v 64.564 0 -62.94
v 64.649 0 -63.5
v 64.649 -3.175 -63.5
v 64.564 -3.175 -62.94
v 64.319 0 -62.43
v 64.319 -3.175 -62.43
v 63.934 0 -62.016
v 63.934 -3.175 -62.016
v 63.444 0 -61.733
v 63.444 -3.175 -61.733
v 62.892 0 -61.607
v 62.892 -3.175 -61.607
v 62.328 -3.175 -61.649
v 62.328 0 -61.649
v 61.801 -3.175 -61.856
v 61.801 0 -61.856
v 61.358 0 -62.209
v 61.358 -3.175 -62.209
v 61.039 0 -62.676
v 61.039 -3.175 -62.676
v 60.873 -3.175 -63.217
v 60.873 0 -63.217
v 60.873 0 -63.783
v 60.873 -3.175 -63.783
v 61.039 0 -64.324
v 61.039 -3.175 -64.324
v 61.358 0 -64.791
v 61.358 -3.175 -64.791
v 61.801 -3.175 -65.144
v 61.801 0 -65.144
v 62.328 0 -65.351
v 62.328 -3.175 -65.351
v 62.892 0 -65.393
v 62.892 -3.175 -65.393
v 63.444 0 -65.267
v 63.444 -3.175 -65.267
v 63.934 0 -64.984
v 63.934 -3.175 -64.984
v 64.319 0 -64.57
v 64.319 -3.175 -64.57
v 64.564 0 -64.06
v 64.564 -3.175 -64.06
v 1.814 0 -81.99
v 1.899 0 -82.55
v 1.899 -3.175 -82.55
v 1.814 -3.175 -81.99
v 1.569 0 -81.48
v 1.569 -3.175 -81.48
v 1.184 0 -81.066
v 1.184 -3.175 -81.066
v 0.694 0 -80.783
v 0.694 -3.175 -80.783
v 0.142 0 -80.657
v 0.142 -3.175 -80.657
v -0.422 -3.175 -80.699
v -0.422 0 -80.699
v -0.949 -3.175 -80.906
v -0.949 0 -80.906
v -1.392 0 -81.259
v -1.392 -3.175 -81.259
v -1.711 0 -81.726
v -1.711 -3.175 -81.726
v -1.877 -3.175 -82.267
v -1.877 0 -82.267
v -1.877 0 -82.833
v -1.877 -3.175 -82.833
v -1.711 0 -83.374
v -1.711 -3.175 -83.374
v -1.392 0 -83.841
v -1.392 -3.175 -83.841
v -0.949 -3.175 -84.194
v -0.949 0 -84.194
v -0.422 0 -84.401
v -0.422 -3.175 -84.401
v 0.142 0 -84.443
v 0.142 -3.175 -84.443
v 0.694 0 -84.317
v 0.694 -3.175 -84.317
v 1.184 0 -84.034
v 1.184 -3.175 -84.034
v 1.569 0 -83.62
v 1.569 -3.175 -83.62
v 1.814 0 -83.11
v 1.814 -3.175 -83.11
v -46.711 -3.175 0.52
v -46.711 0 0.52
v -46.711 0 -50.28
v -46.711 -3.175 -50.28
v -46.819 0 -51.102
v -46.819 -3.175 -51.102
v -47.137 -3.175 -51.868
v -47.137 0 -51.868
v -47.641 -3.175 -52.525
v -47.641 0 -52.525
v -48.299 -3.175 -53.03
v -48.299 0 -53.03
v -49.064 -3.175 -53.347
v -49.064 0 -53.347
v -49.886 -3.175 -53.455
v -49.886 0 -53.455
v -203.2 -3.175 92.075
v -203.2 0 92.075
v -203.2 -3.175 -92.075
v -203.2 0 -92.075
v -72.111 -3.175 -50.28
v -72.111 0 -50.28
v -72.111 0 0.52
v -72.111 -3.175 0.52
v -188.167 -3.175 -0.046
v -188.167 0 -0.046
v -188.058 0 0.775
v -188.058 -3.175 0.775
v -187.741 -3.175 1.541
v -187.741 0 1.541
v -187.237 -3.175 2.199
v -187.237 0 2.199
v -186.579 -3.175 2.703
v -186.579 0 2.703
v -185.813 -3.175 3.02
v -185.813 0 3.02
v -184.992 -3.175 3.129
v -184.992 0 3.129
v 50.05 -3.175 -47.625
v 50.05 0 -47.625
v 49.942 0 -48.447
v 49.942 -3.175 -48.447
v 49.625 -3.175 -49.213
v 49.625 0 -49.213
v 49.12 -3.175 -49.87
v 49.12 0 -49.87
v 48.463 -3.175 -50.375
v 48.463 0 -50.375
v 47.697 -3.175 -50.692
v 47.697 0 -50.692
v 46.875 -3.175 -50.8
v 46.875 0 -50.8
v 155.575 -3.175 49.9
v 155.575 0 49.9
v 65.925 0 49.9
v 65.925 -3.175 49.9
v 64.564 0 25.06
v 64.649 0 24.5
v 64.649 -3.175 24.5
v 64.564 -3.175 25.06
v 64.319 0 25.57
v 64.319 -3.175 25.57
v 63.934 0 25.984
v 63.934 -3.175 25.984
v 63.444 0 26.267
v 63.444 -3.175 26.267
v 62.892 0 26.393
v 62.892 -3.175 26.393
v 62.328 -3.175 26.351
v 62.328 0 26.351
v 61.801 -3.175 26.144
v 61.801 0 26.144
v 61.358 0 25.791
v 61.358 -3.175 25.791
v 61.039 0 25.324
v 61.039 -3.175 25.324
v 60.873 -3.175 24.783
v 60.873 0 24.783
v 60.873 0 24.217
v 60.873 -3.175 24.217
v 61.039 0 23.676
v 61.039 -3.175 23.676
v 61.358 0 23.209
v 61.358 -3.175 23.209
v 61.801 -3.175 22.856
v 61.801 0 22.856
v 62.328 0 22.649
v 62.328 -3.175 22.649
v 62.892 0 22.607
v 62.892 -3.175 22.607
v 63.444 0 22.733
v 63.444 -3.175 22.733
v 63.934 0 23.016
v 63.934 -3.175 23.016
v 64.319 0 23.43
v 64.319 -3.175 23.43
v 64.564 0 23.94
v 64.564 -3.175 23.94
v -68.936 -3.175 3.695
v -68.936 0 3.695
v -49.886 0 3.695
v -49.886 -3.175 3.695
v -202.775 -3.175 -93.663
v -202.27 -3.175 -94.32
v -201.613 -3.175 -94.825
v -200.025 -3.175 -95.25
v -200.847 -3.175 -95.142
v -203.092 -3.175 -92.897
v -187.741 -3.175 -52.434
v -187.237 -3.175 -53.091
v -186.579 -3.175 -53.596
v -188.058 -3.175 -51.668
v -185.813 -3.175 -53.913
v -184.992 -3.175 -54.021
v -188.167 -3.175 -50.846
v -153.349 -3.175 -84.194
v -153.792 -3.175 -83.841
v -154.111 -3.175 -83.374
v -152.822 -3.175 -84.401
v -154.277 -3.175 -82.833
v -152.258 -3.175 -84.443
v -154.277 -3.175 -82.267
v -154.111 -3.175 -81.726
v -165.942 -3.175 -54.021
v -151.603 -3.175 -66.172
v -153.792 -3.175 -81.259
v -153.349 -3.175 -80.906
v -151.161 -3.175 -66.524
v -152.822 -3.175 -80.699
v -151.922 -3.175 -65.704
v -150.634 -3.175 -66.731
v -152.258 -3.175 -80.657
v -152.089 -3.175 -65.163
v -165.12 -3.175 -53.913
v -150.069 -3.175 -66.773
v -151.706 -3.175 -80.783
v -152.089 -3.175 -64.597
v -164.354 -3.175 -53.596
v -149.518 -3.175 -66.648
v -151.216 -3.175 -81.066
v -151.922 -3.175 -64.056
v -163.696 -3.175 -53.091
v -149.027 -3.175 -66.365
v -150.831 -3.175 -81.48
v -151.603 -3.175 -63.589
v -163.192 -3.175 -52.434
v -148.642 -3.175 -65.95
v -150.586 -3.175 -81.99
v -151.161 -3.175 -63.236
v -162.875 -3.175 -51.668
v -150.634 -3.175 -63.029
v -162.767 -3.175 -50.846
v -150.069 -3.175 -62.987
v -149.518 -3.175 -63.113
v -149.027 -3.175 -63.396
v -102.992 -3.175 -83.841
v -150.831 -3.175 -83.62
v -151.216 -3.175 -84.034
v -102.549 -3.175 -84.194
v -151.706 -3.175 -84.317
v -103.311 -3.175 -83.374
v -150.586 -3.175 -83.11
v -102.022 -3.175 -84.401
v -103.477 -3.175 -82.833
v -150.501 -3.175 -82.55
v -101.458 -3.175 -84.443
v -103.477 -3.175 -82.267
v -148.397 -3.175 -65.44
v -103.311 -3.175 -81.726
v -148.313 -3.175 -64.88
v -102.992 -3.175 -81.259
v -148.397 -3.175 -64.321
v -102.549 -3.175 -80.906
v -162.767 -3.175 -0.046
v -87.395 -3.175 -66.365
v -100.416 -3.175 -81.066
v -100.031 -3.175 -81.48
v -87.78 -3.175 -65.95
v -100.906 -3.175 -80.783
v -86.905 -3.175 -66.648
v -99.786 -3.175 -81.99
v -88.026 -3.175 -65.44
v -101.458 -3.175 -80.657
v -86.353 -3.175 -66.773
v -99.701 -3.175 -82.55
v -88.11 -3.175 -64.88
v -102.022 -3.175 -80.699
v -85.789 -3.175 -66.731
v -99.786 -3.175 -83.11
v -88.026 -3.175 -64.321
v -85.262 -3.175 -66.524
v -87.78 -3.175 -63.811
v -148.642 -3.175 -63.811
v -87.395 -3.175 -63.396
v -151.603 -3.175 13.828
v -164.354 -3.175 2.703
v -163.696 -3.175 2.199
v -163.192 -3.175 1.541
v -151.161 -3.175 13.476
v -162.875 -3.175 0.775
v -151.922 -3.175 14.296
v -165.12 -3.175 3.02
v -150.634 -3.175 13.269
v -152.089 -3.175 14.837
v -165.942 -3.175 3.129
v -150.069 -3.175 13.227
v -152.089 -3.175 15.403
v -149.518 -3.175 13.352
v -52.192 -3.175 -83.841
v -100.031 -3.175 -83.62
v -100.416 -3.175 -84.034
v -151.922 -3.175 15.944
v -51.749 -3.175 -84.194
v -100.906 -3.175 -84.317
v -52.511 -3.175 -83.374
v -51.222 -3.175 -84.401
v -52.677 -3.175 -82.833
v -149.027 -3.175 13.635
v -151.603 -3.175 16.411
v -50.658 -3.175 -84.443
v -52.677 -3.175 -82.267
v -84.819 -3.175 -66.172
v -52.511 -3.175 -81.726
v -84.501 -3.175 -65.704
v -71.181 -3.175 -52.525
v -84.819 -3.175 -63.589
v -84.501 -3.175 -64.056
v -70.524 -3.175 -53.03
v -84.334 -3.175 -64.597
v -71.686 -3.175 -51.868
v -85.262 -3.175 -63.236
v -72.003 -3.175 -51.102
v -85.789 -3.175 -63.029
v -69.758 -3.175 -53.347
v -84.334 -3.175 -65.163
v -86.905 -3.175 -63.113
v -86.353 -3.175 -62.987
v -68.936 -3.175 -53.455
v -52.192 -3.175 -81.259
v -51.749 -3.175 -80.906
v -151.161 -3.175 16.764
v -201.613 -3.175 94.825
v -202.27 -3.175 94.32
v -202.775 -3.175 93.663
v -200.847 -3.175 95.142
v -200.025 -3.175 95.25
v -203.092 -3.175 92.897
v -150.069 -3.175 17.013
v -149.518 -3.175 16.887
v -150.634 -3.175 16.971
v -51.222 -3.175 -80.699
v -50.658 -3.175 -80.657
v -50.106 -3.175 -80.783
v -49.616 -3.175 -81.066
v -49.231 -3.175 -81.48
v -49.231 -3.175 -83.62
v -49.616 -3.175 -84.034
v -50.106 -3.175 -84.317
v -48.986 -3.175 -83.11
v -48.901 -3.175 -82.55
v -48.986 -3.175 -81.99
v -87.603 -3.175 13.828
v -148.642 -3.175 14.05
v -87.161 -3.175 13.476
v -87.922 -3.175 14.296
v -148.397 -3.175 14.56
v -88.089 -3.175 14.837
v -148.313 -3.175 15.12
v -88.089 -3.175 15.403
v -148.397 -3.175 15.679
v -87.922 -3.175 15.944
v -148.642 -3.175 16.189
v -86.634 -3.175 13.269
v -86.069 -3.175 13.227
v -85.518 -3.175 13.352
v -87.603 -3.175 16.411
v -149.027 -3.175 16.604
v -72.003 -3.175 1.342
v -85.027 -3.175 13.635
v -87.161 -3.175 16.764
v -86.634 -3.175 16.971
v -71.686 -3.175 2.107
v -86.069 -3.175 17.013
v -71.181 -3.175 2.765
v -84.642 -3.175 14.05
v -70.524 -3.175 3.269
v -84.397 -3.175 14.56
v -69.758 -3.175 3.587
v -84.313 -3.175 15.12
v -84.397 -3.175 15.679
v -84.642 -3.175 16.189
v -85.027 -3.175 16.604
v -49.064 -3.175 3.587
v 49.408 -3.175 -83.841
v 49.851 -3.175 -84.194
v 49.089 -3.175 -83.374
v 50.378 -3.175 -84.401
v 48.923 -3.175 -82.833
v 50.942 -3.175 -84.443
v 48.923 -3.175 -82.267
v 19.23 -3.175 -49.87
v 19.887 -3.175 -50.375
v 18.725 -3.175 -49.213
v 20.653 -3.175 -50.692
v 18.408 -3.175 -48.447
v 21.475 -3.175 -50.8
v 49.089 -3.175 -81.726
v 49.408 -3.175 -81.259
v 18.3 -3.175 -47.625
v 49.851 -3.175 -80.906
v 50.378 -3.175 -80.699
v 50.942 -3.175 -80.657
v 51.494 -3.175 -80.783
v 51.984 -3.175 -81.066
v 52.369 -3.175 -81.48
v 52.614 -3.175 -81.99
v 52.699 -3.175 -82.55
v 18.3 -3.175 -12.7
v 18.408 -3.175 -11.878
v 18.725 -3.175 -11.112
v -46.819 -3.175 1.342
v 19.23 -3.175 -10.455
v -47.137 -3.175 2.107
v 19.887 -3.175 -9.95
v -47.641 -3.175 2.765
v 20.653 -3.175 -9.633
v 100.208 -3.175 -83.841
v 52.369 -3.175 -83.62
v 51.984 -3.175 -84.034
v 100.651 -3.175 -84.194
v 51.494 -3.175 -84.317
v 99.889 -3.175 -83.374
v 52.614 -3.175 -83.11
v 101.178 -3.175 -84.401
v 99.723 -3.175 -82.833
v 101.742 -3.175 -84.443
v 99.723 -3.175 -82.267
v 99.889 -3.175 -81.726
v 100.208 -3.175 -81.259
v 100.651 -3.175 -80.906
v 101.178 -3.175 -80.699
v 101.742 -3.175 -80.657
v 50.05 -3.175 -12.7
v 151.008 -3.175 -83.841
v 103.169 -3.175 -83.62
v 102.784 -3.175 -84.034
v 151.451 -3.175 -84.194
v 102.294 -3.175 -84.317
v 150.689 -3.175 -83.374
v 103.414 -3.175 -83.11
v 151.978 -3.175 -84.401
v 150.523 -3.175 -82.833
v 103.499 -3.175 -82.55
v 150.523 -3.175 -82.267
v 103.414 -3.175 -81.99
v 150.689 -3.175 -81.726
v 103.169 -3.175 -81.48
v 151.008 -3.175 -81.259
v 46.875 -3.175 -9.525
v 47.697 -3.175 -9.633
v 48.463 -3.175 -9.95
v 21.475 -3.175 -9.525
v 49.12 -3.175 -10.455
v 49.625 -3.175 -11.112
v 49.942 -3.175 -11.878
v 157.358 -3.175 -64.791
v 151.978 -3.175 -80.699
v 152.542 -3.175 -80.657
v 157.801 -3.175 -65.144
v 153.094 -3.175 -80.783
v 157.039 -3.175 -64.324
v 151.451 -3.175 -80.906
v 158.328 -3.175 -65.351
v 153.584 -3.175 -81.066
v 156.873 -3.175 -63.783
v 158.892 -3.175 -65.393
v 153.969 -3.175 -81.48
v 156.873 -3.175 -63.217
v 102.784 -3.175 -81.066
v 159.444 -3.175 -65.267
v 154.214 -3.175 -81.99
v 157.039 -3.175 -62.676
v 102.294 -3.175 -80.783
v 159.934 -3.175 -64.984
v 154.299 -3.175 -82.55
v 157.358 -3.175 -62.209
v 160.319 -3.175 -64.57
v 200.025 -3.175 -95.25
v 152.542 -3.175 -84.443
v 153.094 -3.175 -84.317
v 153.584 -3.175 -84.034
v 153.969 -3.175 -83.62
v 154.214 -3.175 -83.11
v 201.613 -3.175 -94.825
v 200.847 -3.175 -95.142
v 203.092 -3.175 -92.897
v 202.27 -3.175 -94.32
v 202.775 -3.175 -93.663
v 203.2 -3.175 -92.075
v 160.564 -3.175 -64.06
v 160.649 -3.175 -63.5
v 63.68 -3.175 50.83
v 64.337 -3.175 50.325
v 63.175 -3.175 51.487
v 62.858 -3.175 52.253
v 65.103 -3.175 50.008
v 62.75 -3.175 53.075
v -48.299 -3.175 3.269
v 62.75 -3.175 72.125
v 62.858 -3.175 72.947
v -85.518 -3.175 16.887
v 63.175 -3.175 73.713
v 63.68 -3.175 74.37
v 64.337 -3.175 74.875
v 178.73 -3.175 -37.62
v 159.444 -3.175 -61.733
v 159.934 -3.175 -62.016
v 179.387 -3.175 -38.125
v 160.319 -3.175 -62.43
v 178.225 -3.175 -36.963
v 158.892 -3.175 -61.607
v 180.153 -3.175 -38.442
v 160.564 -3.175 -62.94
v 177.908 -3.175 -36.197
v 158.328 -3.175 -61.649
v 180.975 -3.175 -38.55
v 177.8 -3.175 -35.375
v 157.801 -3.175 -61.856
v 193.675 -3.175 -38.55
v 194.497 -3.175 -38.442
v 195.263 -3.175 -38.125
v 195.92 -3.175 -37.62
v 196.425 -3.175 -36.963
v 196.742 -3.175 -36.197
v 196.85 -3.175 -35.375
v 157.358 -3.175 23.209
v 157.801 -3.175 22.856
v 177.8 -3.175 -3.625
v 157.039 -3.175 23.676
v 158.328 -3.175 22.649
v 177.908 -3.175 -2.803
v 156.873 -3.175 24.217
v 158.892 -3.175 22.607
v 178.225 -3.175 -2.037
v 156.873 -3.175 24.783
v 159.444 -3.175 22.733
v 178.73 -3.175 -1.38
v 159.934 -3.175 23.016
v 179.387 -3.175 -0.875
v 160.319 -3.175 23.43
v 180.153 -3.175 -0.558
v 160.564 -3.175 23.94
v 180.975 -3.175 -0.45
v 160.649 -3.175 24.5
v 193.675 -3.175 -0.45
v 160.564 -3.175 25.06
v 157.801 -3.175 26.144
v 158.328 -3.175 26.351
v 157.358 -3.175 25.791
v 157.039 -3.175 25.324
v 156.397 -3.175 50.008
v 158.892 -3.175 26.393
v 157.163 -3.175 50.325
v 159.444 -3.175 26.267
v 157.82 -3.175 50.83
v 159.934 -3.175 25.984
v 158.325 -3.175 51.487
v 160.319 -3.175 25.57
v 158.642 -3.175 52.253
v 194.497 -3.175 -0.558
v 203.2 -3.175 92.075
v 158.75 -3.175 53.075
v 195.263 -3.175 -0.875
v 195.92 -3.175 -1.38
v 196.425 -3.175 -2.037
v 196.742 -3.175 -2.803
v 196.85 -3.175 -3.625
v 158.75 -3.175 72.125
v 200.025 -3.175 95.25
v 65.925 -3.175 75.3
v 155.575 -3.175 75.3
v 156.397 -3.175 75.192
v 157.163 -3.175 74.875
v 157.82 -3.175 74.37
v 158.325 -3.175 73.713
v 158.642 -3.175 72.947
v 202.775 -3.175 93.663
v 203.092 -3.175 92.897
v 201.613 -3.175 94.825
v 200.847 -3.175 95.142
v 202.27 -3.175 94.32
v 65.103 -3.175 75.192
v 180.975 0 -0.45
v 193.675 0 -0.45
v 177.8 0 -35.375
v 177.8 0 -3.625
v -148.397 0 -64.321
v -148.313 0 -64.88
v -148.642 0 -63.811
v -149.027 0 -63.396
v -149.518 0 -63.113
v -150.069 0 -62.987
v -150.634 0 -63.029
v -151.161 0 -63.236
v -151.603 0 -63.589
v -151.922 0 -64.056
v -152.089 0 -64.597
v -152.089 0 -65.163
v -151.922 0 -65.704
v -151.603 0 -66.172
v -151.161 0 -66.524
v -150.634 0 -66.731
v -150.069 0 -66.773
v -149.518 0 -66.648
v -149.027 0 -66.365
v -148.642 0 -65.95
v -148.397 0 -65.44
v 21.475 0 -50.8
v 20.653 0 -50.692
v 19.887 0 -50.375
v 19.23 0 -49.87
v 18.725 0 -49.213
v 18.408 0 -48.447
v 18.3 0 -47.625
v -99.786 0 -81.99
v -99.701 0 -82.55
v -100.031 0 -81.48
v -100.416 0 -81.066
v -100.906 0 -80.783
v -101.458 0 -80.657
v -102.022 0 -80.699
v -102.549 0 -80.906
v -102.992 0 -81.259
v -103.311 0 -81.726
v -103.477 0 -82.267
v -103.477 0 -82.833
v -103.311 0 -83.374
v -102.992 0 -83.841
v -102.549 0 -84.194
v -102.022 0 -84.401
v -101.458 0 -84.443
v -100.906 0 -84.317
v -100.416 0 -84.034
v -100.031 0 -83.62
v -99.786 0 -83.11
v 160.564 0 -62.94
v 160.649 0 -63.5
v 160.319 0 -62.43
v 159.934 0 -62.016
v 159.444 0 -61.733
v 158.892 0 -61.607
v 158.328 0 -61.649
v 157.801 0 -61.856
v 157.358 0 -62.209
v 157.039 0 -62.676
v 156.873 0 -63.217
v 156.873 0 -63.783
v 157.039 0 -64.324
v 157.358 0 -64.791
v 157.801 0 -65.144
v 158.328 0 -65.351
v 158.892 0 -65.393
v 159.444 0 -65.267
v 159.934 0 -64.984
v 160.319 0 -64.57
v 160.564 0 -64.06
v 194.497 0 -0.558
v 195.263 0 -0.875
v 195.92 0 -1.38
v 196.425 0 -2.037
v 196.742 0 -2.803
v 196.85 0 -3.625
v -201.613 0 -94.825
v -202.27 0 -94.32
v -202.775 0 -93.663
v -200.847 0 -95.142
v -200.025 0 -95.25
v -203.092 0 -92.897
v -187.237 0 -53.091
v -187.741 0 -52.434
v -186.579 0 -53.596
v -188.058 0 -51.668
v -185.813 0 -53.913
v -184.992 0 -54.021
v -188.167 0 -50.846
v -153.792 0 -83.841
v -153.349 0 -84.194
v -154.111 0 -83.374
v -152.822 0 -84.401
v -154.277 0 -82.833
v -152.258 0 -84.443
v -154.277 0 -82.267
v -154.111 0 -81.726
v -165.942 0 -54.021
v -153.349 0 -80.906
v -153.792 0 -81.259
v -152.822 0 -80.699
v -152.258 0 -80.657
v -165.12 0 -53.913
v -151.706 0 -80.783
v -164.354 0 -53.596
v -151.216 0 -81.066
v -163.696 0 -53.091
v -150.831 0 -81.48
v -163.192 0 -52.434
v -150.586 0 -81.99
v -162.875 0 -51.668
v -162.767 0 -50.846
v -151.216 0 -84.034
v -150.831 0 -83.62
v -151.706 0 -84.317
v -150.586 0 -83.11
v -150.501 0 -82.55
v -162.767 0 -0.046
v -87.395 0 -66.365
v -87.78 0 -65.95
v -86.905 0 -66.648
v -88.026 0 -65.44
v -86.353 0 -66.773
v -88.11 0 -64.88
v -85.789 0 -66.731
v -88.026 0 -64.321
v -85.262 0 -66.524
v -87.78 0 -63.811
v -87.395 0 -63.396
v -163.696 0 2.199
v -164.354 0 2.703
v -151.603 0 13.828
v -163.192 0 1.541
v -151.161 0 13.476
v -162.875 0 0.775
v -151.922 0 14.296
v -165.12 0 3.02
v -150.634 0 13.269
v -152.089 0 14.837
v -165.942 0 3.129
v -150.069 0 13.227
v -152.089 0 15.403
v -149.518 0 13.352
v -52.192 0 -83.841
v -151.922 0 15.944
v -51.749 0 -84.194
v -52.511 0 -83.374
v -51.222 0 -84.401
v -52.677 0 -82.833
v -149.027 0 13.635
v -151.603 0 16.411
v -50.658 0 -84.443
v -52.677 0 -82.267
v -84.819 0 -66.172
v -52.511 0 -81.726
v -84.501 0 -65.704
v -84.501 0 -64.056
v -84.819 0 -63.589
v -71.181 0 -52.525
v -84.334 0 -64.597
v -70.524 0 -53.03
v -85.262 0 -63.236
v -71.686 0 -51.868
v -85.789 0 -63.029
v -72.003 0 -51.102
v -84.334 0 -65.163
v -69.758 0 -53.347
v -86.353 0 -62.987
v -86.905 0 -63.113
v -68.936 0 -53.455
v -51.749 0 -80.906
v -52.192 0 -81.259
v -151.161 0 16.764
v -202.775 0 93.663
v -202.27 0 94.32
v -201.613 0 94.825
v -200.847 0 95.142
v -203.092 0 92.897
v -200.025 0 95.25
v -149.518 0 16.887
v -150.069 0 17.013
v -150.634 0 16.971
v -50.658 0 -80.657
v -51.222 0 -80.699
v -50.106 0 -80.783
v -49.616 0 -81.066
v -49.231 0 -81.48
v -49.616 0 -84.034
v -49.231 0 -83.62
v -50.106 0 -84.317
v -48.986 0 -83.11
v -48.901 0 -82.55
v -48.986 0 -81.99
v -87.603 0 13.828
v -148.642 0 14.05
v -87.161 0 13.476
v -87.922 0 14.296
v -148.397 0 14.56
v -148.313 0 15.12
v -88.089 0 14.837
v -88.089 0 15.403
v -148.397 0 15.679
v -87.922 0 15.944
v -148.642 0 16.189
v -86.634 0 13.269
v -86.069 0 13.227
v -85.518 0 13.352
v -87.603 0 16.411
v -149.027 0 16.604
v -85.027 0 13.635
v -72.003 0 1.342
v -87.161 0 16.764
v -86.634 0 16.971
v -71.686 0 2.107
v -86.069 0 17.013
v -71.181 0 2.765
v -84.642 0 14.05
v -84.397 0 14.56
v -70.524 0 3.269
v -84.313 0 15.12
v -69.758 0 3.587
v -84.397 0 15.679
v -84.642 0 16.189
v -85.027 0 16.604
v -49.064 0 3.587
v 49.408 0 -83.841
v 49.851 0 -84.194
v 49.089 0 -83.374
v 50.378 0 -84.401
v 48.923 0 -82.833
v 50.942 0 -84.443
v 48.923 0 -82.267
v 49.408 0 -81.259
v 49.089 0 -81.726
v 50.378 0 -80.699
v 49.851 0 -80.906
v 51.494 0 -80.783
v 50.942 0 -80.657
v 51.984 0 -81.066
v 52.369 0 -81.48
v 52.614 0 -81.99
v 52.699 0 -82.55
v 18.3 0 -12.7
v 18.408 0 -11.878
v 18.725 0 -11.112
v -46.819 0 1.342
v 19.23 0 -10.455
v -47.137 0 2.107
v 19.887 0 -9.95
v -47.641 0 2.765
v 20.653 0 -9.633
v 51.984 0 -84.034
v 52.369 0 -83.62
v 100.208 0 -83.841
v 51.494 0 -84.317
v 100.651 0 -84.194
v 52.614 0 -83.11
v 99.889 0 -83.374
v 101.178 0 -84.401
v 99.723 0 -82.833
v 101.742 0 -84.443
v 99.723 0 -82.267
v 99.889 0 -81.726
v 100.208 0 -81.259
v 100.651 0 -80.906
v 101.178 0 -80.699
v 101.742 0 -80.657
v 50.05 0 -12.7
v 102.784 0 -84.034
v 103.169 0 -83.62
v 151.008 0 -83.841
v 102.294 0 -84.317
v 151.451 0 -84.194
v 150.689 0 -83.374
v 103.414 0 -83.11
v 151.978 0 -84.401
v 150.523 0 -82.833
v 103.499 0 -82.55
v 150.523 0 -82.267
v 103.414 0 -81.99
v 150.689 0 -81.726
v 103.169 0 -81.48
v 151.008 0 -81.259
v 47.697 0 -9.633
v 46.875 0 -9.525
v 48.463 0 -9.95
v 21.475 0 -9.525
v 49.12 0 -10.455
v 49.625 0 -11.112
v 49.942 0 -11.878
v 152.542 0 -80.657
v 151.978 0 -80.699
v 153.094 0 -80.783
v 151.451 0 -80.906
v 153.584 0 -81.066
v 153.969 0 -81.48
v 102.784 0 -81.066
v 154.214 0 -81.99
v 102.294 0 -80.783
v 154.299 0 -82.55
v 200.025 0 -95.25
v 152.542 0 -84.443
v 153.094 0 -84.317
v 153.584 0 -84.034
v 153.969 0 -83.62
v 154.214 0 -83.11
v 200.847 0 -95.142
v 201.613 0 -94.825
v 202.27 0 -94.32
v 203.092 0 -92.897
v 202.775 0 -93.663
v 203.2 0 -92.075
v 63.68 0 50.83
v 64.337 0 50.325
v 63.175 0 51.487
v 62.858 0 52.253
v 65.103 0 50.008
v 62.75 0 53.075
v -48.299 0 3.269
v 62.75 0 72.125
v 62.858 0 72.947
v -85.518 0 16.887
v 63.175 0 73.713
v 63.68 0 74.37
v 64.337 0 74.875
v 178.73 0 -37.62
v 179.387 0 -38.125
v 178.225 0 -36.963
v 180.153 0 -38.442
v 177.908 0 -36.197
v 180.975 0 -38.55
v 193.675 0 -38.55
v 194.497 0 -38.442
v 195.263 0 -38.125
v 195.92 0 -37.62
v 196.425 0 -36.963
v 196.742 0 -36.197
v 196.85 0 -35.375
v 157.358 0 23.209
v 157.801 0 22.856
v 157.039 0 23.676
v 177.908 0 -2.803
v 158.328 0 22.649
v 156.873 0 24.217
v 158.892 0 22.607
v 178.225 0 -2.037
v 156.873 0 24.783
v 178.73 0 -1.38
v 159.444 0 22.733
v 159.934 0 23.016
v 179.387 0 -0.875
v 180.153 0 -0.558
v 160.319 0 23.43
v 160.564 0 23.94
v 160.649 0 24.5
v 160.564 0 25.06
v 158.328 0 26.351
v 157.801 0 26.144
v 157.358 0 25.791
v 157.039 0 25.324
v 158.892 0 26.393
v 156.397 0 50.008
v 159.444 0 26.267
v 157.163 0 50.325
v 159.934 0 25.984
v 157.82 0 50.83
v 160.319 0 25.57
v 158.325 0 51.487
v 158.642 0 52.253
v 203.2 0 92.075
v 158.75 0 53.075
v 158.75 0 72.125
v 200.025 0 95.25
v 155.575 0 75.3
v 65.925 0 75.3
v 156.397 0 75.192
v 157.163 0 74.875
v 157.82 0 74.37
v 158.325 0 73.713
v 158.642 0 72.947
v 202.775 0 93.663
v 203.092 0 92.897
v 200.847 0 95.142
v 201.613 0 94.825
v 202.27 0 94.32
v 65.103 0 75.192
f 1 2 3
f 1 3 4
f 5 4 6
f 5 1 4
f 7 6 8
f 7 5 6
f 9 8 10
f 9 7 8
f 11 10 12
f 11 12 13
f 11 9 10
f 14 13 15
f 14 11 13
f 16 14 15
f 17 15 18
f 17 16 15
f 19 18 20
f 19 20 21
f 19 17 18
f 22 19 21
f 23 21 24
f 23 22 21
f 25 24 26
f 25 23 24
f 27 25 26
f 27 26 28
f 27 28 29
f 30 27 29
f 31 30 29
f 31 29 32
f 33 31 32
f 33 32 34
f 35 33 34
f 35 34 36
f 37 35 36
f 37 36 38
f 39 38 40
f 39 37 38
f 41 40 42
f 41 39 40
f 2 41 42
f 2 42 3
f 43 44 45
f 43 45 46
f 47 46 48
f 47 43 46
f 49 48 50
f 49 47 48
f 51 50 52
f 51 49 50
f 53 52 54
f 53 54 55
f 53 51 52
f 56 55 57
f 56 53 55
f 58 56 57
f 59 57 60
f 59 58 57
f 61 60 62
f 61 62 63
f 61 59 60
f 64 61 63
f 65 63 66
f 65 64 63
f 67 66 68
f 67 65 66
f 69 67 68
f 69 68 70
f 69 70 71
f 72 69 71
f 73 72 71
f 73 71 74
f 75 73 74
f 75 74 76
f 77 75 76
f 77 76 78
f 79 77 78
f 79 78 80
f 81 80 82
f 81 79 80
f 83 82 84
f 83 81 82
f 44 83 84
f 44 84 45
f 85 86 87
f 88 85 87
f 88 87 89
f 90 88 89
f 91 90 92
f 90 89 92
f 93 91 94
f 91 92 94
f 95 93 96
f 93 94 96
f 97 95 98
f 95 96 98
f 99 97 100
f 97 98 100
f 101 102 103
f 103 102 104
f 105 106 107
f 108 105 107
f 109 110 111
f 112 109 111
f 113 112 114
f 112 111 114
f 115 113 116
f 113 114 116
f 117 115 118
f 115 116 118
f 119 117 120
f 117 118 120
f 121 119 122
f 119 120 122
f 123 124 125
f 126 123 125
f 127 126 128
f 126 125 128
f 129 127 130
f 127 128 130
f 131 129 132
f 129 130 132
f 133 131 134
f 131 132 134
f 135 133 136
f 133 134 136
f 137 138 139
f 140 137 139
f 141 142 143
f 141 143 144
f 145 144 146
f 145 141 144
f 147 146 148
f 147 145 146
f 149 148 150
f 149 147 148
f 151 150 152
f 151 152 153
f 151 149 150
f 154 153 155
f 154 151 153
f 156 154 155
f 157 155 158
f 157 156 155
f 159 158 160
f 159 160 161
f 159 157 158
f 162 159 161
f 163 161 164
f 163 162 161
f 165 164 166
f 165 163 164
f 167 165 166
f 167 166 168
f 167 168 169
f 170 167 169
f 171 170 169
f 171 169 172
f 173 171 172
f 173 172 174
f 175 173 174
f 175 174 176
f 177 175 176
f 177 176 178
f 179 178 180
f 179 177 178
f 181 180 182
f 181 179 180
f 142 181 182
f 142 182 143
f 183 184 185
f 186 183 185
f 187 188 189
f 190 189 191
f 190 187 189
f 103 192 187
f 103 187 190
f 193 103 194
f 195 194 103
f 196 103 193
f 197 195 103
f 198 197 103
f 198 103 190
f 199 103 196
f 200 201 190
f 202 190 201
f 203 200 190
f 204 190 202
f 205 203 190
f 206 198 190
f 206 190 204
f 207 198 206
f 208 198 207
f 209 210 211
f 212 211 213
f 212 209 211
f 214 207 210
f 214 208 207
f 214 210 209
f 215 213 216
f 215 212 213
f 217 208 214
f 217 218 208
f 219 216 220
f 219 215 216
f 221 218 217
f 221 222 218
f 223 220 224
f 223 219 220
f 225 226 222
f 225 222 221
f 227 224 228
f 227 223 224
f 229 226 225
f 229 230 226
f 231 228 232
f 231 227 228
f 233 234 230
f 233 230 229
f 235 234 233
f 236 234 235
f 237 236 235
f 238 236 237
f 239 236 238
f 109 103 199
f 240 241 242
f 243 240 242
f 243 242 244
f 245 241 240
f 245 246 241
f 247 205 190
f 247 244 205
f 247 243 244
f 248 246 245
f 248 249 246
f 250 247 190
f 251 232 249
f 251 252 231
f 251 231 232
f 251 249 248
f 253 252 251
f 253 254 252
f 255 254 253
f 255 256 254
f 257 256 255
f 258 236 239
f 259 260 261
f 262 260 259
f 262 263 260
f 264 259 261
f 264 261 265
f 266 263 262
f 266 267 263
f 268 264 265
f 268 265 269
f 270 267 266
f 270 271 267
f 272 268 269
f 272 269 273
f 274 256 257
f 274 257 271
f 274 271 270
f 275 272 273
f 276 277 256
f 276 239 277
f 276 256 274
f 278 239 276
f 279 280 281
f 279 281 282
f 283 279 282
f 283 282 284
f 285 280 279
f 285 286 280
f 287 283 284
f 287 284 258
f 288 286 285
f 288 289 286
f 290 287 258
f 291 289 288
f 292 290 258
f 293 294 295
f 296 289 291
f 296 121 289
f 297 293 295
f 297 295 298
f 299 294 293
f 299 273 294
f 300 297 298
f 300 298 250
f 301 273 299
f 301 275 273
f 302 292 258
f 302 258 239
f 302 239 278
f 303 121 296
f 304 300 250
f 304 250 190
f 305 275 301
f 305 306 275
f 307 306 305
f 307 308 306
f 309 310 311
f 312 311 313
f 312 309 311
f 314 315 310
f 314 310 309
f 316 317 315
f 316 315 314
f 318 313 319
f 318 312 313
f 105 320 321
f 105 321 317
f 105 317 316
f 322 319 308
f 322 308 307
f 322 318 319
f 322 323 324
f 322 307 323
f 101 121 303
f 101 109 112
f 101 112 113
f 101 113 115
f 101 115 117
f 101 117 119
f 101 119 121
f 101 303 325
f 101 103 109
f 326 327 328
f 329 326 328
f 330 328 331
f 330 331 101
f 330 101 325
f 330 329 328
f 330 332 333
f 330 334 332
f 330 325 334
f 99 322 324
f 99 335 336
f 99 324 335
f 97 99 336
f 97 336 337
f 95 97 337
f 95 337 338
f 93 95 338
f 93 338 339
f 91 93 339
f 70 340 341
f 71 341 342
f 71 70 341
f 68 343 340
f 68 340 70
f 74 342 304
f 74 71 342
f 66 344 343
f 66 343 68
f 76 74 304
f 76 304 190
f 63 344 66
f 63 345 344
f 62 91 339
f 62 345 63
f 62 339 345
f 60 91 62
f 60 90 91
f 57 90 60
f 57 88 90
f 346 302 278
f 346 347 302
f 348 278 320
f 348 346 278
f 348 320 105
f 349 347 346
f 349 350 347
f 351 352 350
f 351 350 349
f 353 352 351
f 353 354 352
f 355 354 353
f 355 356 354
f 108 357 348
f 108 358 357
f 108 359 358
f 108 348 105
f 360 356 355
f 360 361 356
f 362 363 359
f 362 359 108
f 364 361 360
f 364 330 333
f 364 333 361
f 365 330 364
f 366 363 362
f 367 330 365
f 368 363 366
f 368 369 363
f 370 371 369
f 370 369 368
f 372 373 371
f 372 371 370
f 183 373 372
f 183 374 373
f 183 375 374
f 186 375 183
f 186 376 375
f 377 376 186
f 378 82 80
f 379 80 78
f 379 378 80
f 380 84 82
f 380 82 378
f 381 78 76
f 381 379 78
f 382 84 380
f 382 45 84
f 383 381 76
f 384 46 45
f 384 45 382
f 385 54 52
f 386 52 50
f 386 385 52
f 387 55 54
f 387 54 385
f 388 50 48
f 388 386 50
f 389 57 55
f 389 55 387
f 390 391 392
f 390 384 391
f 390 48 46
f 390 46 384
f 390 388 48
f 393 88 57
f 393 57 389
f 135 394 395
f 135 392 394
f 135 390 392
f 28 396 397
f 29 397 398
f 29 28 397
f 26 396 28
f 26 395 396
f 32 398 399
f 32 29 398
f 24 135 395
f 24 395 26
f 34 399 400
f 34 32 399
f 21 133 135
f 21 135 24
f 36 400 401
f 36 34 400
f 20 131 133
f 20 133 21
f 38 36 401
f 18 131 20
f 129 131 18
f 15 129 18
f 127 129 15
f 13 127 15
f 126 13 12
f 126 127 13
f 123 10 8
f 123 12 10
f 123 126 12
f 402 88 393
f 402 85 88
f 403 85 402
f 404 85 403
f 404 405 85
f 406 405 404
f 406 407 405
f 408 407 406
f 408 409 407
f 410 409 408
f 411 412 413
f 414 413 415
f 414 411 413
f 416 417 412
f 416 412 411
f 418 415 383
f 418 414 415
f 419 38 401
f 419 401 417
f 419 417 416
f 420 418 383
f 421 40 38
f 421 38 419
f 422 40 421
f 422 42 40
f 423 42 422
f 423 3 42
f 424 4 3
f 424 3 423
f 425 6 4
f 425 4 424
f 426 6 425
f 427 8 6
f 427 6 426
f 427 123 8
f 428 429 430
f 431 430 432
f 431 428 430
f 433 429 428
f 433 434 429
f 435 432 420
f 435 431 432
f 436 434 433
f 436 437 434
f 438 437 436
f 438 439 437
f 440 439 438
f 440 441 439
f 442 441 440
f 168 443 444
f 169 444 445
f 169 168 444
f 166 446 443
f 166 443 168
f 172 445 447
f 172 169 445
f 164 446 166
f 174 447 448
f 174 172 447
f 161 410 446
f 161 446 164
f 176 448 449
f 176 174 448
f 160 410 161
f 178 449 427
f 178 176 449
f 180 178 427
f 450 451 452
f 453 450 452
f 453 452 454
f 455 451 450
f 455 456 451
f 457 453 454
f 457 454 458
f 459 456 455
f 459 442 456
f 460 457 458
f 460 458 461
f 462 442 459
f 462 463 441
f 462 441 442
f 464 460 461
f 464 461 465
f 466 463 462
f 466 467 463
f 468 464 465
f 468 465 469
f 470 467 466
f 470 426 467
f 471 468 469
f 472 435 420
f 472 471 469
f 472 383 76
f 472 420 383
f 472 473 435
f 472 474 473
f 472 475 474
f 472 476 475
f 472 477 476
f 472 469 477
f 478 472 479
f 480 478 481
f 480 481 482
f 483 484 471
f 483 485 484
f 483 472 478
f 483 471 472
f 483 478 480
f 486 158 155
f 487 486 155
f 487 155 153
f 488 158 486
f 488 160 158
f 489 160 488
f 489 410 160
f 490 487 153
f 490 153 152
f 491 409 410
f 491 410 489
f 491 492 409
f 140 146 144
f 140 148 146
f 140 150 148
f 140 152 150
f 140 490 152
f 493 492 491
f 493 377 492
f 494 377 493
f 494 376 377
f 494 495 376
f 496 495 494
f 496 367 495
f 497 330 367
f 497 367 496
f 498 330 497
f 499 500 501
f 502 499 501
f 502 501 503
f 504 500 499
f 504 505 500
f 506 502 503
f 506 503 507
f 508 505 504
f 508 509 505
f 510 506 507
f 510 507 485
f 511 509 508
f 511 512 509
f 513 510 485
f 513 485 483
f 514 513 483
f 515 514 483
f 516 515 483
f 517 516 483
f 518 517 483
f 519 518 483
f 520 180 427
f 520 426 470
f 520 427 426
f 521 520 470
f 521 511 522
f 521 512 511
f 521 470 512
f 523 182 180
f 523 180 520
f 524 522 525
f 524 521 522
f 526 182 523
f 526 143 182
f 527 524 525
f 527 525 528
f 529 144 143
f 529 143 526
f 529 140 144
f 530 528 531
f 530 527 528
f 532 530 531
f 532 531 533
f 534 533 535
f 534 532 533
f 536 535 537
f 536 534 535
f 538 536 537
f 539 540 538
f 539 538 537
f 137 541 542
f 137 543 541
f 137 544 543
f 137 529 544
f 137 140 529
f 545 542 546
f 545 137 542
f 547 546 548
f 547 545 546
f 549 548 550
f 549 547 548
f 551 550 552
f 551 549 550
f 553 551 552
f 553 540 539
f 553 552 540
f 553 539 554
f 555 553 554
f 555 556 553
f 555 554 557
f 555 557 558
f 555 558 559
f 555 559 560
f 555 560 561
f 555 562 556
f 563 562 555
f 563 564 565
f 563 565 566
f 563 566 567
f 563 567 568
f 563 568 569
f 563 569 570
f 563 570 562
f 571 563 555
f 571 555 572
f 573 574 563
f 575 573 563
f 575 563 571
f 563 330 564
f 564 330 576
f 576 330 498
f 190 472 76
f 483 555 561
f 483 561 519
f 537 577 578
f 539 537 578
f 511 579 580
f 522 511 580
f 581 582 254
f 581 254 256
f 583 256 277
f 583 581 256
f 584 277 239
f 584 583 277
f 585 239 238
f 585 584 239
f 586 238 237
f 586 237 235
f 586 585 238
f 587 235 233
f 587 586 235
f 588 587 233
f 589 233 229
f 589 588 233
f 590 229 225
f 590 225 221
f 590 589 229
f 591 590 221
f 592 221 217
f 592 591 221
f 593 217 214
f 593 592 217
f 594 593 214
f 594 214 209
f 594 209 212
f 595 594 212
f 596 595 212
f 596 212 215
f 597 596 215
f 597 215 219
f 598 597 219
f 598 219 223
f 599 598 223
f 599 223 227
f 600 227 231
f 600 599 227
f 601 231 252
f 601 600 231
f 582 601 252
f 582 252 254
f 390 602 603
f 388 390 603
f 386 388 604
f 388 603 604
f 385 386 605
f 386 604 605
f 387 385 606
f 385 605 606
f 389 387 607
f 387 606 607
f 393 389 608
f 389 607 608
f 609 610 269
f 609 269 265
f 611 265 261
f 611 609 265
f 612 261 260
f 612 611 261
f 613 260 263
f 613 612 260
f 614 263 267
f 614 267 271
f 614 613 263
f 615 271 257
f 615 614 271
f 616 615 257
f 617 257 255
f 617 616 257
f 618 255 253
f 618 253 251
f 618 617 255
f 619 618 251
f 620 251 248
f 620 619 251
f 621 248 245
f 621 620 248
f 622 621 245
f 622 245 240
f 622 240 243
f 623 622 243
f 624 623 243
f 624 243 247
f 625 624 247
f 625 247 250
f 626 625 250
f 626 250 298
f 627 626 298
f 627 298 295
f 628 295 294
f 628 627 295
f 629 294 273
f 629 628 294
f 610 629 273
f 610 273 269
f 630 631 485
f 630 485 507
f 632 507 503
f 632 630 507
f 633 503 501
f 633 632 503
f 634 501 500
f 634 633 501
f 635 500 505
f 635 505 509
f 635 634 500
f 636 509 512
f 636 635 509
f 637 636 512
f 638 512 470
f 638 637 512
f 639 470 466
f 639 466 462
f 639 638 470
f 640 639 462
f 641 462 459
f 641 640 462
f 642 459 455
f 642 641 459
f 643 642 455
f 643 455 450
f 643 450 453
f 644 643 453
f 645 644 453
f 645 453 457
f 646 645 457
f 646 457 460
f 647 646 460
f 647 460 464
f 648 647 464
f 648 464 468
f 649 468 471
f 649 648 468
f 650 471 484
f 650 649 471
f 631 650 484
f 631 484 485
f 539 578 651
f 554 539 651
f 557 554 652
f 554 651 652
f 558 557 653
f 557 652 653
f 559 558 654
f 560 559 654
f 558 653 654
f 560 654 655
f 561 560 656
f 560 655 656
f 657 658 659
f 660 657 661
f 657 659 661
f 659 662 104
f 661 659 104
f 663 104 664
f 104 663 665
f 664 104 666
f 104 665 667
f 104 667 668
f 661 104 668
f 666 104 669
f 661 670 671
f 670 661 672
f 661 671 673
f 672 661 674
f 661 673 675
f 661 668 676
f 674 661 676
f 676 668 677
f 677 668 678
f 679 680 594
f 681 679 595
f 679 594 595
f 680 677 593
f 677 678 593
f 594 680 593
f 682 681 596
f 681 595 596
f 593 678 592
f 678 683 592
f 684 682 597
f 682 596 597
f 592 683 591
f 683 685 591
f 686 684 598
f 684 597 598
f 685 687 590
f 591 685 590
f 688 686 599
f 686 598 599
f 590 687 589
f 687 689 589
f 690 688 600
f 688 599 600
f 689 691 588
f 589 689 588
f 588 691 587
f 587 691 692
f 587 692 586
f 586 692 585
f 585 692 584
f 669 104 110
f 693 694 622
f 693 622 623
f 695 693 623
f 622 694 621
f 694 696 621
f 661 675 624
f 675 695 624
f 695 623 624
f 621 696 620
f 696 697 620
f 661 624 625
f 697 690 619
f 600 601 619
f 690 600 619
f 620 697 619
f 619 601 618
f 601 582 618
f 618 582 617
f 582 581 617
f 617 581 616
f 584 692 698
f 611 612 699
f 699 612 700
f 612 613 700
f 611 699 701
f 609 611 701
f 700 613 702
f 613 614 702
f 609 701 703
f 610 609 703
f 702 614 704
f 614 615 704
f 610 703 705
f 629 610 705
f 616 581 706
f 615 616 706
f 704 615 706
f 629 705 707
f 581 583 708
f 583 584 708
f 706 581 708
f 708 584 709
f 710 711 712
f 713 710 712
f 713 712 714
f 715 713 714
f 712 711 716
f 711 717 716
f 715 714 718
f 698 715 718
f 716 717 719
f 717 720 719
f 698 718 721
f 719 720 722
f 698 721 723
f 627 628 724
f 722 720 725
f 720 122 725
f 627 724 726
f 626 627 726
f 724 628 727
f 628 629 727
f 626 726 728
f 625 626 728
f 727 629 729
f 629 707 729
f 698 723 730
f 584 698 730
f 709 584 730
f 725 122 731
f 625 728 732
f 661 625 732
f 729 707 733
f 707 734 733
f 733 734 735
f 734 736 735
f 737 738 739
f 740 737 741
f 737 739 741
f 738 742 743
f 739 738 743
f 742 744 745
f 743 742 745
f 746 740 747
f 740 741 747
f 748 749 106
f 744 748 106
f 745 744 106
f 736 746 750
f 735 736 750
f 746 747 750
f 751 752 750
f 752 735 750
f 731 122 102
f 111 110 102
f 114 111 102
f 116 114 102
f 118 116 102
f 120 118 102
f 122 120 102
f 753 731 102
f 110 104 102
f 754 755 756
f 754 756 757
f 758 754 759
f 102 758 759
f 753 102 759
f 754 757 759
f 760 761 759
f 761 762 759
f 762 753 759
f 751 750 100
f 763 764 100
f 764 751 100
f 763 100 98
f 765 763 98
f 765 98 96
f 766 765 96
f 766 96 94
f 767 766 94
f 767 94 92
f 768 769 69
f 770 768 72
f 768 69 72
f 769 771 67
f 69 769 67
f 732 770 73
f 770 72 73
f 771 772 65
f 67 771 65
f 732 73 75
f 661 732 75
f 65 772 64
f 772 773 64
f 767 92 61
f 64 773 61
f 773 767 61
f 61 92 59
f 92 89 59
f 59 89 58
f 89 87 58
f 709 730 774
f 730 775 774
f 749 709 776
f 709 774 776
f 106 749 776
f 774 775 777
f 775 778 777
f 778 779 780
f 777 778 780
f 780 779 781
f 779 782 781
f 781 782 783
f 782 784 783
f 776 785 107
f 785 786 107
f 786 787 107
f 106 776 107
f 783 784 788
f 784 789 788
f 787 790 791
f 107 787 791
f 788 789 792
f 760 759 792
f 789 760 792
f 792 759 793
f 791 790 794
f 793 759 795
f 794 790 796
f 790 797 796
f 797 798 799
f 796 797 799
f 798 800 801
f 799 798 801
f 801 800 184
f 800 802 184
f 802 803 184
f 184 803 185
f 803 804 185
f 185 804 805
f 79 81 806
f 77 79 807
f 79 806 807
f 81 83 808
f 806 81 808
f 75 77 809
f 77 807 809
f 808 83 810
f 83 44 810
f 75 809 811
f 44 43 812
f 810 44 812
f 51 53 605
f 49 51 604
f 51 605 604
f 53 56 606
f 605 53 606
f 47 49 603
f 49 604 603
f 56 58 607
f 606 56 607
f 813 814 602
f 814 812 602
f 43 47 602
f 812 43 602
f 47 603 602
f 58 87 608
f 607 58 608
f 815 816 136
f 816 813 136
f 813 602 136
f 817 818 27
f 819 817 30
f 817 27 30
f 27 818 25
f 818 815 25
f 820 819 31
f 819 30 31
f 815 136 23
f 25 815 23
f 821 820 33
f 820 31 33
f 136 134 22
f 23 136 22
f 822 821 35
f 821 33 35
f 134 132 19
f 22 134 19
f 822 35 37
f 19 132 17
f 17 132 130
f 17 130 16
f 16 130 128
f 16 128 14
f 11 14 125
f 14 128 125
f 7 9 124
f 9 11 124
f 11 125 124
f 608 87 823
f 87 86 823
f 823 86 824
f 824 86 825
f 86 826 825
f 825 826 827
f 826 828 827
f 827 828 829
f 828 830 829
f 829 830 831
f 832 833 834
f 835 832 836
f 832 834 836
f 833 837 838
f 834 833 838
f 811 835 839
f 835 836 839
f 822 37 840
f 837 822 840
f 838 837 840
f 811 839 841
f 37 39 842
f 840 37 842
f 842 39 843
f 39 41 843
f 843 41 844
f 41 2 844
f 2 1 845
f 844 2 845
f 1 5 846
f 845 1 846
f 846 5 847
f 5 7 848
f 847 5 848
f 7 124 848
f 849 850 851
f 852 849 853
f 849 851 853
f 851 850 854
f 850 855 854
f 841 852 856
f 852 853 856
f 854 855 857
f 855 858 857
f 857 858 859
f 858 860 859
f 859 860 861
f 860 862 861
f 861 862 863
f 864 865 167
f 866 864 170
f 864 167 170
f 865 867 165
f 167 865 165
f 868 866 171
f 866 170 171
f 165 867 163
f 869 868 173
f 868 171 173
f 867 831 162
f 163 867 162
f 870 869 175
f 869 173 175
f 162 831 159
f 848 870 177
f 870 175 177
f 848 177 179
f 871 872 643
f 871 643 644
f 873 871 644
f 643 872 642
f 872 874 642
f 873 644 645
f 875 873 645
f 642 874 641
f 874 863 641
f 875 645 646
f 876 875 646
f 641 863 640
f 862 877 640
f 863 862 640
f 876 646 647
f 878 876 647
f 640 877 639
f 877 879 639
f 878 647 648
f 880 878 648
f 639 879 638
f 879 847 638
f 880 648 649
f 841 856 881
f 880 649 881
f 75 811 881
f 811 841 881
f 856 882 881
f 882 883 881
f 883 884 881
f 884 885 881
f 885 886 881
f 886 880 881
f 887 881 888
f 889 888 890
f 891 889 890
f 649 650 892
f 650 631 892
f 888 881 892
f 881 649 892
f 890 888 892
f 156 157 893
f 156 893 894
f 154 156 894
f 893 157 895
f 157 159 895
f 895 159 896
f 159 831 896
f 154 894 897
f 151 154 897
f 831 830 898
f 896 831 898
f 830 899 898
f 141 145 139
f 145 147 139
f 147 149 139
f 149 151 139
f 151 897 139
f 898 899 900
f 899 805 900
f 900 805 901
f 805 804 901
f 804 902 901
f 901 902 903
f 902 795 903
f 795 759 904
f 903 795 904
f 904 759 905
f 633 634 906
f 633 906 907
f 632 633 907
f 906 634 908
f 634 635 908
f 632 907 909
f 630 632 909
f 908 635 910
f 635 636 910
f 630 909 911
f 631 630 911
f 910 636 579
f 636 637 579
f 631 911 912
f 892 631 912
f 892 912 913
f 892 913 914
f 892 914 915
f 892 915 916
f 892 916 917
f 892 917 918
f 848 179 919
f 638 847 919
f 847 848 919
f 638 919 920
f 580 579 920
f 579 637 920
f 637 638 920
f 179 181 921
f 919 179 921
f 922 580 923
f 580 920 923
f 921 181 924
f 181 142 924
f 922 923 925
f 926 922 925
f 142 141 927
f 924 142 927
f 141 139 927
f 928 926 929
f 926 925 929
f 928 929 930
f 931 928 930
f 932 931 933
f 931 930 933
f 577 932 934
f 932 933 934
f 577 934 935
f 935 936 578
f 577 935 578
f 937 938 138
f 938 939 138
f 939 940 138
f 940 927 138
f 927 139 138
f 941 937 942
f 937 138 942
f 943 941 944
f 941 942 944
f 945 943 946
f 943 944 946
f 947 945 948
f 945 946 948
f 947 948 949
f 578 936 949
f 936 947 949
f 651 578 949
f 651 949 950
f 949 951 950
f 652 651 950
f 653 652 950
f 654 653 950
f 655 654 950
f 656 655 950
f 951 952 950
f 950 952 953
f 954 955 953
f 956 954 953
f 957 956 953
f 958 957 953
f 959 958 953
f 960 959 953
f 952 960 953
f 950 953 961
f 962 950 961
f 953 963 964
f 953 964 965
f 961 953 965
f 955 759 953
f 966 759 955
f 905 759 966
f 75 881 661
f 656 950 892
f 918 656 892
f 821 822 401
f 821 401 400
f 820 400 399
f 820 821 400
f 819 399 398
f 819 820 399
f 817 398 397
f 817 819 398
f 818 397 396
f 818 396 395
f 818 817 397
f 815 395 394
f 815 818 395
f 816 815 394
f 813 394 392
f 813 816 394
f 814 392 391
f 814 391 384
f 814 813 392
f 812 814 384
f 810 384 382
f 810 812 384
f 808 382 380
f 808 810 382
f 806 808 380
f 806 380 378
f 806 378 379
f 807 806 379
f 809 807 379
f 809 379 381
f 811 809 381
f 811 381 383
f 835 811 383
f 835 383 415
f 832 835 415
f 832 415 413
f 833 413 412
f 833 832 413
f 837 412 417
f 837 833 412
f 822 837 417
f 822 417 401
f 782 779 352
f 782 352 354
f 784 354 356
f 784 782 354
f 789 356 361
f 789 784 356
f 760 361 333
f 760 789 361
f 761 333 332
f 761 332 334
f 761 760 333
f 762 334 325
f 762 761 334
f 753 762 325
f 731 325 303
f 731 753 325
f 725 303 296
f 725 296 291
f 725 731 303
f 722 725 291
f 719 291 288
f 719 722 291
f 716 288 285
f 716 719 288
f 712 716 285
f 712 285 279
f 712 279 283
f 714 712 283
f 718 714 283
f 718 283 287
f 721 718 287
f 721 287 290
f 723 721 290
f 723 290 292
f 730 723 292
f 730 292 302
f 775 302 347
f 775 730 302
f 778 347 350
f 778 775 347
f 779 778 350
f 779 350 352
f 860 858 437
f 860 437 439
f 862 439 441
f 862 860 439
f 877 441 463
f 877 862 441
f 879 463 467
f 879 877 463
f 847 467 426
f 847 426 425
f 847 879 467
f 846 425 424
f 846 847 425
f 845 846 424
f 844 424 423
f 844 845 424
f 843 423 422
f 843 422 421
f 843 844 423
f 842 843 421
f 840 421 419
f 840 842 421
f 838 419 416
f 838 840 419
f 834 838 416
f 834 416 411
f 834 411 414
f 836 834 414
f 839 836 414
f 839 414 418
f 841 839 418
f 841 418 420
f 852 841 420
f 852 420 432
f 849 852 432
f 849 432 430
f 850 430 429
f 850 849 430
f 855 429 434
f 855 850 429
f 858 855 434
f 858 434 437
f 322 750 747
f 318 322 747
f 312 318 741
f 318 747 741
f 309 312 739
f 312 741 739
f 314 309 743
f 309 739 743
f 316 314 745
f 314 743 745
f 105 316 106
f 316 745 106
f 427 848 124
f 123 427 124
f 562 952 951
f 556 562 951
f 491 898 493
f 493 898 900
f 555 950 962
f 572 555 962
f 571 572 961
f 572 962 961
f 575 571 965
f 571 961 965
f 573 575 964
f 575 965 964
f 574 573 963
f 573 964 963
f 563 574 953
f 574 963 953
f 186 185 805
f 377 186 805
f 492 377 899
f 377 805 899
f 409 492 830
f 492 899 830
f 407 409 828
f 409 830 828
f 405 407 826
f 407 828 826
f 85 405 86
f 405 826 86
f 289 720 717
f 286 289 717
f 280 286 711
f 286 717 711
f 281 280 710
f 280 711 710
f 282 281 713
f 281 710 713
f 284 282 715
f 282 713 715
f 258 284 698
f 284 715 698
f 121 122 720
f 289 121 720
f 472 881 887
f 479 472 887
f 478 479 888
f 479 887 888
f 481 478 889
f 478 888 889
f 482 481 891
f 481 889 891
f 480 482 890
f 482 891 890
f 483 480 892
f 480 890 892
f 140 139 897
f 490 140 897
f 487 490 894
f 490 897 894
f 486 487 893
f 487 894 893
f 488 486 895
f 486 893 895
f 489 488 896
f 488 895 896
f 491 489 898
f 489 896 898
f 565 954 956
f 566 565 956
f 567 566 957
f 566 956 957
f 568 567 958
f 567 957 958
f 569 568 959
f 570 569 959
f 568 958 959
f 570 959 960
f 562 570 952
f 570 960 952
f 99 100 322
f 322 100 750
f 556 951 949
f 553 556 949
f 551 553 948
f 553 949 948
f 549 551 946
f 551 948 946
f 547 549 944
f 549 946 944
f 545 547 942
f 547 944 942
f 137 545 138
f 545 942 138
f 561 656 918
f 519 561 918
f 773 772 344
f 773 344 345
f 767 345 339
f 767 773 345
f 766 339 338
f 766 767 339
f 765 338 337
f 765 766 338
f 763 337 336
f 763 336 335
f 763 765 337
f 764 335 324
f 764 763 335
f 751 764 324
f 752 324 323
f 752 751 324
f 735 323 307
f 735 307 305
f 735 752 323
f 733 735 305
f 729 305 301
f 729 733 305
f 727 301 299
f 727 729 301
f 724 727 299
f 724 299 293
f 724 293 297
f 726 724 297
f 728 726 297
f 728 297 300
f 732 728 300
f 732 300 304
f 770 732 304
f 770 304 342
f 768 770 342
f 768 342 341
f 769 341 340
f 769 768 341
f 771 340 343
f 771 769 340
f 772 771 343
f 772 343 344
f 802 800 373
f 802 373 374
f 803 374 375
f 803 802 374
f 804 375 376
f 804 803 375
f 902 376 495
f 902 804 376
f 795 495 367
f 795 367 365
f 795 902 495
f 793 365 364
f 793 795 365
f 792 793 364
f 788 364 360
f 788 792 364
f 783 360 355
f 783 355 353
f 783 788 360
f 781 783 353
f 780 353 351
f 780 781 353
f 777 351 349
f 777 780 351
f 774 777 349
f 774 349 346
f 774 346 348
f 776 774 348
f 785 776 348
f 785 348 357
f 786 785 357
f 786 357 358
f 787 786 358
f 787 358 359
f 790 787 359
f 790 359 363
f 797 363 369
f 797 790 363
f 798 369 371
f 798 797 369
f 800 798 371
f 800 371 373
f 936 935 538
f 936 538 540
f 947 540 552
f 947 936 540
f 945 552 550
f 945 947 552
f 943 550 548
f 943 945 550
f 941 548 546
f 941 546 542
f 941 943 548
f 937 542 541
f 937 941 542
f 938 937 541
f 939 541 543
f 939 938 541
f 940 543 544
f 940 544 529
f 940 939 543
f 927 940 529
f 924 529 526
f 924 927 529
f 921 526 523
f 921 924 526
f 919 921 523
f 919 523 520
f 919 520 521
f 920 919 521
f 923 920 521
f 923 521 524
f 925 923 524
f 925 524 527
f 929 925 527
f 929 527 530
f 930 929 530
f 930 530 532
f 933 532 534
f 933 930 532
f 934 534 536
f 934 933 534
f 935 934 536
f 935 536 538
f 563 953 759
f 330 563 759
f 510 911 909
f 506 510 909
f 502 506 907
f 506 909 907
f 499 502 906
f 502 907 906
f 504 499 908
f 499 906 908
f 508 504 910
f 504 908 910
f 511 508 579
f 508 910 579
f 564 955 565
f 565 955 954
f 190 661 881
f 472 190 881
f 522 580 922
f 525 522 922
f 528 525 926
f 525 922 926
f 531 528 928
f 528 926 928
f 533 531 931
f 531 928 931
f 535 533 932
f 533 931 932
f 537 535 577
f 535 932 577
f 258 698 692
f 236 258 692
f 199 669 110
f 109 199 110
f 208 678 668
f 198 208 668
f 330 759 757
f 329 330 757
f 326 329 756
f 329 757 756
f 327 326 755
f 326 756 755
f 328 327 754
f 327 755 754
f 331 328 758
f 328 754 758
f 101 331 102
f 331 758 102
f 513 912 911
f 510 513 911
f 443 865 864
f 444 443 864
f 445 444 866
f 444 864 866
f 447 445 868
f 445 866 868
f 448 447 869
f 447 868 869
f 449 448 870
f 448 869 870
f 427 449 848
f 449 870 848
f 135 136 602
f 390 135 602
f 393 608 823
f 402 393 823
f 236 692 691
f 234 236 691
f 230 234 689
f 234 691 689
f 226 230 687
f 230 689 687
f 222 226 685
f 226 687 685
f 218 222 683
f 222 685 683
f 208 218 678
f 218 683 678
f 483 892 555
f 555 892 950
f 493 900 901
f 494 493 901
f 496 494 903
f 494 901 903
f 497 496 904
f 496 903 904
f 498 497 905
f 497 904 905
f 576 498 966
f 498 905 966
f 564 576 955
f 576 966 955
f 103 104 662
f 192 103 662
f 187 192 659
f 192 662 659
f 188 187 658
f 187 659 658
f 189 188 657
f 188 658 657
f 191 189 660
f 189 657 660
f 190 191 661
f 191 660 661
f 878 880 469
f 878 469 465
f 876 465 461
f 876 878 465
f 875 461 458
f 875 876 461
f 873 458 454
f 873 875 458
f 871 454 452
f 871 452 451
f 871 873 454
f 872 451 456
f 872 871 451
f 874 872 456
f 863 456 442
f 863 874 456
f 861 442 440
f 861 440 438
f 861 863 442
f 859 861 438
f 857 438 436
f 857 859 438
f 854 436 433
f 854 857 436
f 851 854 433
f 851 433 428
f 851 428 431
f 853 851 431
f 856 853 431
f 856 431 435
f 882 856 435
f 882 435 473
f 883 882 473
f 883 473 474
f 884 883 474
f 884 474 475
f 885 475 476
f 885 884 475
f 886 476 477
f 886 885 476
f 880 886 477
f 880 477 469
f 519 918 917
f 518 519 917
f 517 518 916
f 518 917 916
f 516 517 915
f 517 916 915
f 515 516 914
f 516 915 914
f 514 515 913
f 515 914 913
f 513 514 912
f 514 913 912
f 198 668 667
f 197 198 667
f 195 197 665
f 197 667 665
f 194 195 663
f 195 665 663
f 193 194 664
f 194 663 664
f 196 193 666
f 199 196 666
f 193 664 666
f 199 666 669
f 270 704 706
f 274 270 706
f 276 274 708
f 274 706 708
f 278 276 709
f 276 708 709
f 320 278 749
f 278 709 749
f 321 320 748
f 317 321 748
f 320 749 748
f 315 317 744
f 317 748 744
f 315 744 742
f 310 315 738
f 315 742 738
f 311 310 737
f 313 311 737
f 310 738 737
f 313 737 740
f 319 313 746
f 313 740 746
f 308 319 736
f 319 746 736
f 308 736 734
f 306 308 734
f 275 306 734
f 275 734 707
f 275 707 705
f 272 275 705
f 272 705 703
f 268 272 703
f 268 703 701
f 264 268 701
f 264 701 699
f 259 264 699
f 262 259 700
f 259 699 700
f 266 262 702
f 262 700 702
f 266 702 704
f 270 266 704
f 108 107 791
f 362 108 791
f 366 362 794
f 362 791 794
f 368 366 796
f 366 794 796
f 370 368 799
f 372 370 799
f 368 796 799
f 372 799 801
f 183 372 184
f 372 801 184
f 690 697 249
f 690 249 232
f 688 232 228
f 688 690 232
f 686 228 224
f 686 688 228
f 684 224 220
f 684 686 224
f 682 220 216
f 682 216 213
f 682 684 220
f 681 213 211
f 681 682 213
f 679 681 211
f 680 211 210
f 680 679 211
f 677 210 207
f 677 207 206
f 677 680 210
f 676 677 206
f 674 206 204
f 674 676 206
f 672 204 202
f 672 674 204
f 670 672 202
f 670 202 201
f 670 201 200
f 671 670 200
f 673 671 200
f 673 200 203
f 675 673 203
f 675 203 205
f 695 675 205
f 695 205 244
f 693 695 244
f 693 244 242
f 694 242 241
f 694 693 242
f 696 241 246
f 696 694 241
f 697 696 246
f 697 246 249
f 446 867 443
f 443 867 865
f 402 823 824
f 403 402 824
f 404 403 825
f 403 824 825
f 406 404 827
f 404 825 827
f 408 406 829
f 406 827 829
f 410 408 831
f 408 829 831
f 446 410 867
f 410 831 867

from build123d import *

# Parameters (mm, degrees)
F0_R     = 1.89865
F1_DEPTH = 3.175


with BuildPart() as f1:
    # F0 (on Front) → F1 (new body)
    with BuildSketch(Plane.XZ):
        with BuildLine():
            Line((200.025, 95.25), (-200.025, 95.25))
            ThreePointArc((-200.025, 95.25), (-202.2700640303, 94.3200640303), (-203.2, 92.075))
            Line((-203.2, 92.075), (-203.2, -92.075))
            ThreePointArc((-203.2, -92.075), (-202.2700640303, -94.3200640303), (-200.025, -95.25))
            Line((-200.025, -95.25), (200.025, -95.25))
            ThreePointArc((200.025, -95.25), (202.2700640303, -94.3200640303), (203.2, -92.075))
            Line((203.2, -92.075), (203.2, 92.075))
            ThreePointArc((203.2, 92.075), (202.2700640303, 94.3200640303), (200.025, 95.25))
        make_face()
        with Locations((-152.4, -82.55)):
            Circle(F0_R, mode=Mode.SUBTRACT)
        with Locations((-101.6, -82.55)):
            Circle(F0_R, mode=Mode.SUBTRACT)
        with Locations((-150.2112307024, -64.8801388249)):
            Circle(F0_R, mode=Mode.SUBTRACT)
        with Locations((-50.8, -82.55)):
            Circle(F0_R, mode=Mode.SUBTRACT)
        with Locations((0, -82.55)):
            Circle(F0_R, mode=Mode.SUBTRACT)
        with BuildLine():
            ThreePointArc((-84.3125807024, -64.8801388249), (-86.2112307024, -66.7787888249), (-88.1098807024, -64.8801388249))
            ThreePointArc((-88.1098807024, -64.8801388249), (-86.2112307024, -62.9814888249), (-84.3125807024, -64.8801388249))
        make_face(mode=Mode.SUBTRACT)
        with BuildLine():
            ThreePointArc((-188.1665156039, -0.0463944584), (-187.2365796342, 2.1986695719), (-184.9915156039, 3.1286055416))
            Line((-184.9915156039, 3.1286055416), (-165.9415156039, 3.1286055416))
            ThreePointArc((-165.9415156039, 3.1286055416), (-163.6964515737, 2.1986695719), (-162.7665156039, -0.0463944584))
            Line((-162.7665156039, -0.0463944584), (-162.7665156039, -50.8463944584))
            ThreePointArc((-162.7665156039, -50.8463944584), (-163.6964515737, -53.0914584887), (-165.9415156039, -54.0213944584))
            Line((-165.9415156039, -54.0213944584), (-184.9915156039, -54.0213944584))
            ThreePointArc((-184.9915156039, -54.0213944584), (-187.2365796342, -53.0914584887), (-188.1665156039, -50.8463944584))
            Line((-188.1665156039, -50.8463944584), (-188.1665156039, -0.0463944584))
        make_face(mode=Mode.SUBTRACT)
        with BuildLine():
            ThreePointArc((-72.1112307024, 0.5198611751), (-71.1812947327, 2.7649252054), (-68.9362307024, 3.6948611751))
            Line((-68.9362307024, 3.6948611751), (-49.8862307024, 3.6948611751))
            ThreePointArc((-49.8862307024, 3.6948611751), (-47.6411666721, 2.7649252054), (-46.7112307024, 0.5198611751))
            Line((-46.7112307024, 0.5198611751), (-46.7112307024, -50.2801388249))
            ThreePointArc((-46.7112307024, -50.2801388249), (-47.6411666721, -52.5252028551), (-49.8862307024, -53.4551388249))
            Line((-49.8862307024, -53.4551388249), (-68.9362307024, -53.4551388249))
            ThreePointArc((-68.9362307024, -53.4551388249), (-71.1812947327, -52.5252028551), (-72.1112307024, -50.2801388249))
            Line((-72.1112307024, -50.2801388249), (-72.1112307024, 0.5198611751))
        make_face(mode=Mode.SUBTRACT)
        with Locations((50.8, -82.55)):
            Circle(F0_R, mode=Mode.SUBTRACT)
        with Locations((101.6, -82.55)):
            Circle(F0_R, mode=Mode.SUBTRACT)
        with Locations((62.75, -63.5)):
            Circle(F0_R, mode=Mode.SUBTRACT)
        with Locations((152.4, -82.55)):
            Circle(F0_R, mode=Mode.SUBTRACT)
        with Locations((158.75, -63.5)):
            Circle(F0_R, mode=Mode.SUBTRACT)
        with BuildLine():
            ThreePointArc((18.3, -12.7), (19.2299359697, -10.4549359697), (21.475, -9.525))
            Line((21.475, -9.525), (46.875, -9.525))
            ThreePointArc((46.875, -9.525), (49.1200640303, -10.4549359697), (50.05, -12.7))
            Line((50.05, -12.7), (50.05, -47.625))
            ThreePointArc((50.05, -47.625), (49.1200640303, -49.8700640303), (46.875, -50.8))
            Line((46.875, -50.8), (21.475, -50.8))
            ThreePointArc((21.475, -50.8), (19.2299359697, -49.8700640303), (18.3, -47.625))
            Line((18.3, -47.625), (18.3, -12.7))
        make_face(mode=Mode.SUBTRACT)
        with BuildLine():
            ThreePointArc((196.85, -35.375), (195.9200640303, -37.6200640303), (193.675, -38.55))
            Line((193.675, -38.55), (180.975, -38.55))
            ThreePointArc((180.975, -38.55), (178.7299359697, -37.6200640303), (177.8, -35.375))
            Line((177.8, -35.375), (177.8, -3.625))
            ThreePointArc((177.8, -3.625), (178.7299359697, -1.3799359697), (180.975, -0.45))
            Line((180.975, -0.45), (193.675, -0.45))
            ThreePointArc((193.675, -0.45), (195.9200640303, -1.3799359697), (196.85, -3.625))
            Line((196.85, -3.625), (196.85, -35.375))
        make_face(mode=Mode.SUBTRACT)
        with Locations((-150.2112307024, 15.1198611751)):
            Circle(F0_R, mode=Mode.SUBTRACT)
        with Locations((-86.2112307024, 15.1198611751)):
            Circle(F0_R, mode=Mode.SUBTRACT)
        with Locations((62.75, 24.5)):
            Circle(F0_R, mode=Mode.SUBTRACT)
        with Locations((158.75, 24.5)):
            Circle(F0_R, mode=Mode.SUBTRACT)
        with BuildLine():
            Line((155.575, 49.9), (65.925, 49.9))
            ThreePointArc((65.925, 49.9), (63.6799359697, 50.8299359697), (62.75, 53.075))
            Line((62.75, 53.075), (62.75, 72.125))
            ThreePointArc((62.75, 72.125), (63.6799359697, 74.3700640303), (65.925, 75.3))
            Line((65.925, 75.3), (155.575, 75.3))
            ThreePointArc((155.575, 75.3), (157.8200640303, 74.3700640303), (158.75, 72.125))
            Line((158.75, 72.125), (158.75, 53.075))
            ThreePointArc((158.75, 53.075), (157.8200640303, 50.8299359697), (155.575, 49.9))
        make_face(mode=Mode.SUBTRACT)
    extrude(amount=F1_DEPTH)


solid = f1.part
